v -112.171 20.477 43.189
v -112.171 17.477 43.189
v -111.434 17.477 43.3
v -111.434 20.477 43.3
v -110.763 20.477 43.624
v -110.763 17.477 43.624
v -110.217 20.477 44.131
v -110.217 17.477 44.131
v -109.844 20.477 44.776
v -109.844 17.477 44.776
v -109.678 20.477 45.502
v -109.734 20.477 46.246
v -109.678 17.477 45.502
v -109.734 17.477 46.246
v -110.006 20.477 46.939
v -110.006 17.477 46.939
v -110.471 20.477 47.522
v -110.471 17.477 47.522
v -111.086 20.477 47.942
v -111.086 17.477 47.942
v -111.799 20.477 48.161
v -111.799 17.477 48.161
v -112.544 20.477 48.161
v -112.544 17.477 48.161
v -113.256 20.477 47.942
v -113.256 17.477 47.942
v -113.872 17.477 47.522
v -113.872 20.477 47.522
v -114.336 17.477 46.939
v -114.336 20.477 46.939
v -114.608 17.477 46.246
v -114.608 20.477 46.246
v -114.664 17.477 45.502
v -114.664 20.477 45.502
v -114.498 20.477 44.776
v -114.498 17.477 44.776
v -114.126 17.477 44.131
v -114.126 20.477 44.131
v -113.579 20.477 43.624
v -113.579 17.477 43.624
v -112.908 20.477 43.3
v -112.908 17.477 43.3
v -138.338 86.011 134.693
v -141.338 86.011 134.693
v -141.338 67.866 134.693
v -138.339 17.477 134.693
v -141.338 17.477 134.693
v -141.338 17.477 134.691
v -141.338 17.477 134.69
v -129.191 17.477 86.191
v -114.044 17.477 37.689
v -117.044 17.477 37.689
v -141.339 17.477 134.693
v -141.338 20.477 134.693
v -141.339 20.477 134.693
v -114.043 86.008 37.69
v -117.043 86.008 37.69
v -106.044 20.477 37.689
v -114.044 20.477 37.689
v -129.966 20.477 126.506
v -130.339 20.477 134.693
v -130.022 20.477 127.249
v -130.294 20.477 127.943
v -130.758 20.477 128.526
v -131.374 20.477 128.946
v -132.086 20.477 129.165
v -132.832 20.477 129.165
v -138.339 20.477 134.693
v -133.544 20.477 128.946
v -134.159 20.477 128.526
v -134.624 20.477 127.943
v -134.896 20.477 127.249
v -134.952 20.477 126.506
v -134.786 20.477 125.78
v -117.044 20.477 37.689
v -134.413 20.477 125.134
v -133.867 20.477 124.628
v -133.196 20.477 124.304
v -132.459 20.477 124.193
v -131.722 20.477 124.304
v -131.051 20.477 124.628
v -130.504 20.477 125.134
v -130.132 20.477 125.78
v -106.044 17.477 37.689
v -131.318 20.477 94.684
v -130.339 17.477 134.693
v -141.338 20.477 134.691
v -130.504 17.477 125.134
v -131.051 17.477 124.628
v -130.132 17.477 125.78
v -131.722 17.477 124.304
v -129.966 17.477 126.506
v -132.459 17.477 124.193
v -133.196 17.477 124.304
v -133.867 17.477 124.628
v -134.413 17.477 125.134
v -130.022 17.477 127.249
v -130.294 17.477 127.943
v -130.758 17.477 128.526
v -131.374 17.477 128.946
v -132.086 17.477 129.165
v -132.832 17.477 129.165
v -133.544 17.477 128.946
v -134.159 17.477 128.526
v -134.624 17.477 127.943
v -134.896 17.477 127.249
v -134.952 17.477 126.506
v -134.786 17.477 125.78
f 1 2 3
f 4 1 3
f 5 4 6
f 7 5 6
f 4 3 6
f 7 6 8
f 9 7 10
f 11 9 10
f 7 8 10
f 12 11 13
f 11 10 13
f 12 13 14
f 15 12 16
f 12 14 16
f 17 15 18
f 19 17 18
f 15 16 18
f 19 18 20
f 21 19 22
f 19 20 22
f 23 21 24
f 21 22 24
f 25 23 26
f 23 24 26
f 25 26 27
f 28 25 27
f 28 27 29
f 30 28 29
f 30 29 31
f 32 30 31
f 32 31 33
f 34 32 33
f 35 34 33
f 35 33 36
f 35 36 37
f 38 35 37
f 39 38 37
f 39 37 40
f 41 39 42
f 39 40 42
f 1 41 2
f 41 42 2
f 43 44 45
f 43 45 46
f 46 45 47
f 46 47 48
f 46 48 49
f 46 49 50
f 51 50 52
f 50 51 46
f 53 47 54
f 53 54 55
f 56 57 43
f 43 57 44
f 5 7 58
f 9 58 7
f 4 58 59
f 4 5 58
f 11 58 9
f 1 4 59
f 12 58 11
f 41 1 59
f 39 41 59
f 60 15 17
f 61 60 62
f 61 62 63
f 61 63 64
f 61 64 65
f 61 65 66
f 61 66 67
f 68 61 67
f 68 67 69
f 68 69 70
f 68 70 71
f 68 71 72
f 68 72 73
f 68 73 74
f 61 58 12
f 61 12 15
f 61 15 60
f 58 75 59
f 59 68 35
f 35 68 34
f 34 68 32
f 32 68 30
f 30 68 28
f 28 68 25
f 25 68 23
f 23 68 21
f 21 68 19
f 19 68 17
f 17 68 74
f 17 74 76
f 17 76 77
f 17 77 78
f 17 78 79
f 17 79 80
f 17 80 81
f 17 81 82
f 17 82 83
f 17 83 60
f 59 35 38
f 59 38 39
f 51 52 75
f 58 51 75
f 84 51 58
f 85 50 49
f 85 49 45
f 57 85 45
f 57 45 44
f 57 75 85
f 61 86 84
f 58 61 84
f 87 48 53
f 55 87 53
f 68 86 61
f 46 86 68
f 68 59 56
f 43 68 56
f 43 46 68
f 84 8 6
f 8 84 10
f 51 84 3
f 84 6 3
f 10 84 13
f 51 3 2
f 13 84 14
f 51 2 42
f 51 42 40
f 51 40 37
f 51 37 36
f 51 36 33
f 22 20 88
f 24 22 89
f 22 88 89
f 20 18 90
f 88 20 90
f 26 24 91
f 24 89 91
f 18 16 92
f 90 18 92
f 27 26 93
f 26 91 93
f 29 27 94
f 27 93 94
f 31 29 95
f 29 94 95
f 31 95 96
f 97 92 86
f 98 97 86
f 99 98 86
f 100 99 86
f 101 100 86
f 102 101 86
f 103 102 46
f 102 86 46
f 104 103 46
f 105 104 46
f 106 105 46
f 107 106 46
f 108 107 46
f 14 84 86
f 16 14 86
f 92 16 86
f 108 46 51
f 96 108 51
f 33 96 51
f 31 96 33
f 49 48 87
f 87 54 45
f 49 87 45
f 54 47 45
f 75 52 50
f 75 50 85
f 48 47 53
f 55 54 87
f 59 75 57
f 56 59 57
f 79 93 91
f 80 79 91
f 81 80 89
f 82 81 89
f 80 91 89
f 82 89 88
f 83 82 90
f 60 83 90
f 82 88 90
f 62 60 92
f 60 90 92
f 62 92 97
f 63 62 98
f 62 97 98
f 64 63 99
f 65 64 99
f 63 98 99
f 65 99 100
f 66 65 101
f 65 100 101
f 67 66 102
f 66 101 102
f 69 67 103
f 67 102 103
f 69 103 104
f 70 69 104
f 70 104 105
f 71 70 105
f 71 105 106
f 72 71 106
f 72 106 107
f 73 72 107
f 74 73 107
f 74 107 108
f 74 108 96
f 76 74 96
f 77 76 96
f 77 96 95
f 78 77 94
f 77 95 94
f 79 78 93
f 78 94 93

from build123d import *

# Parameters (mm, degrees)
BOSS_EXTRUDE6_START       = -141.338468014
BOSS_EXTRUDE6_DEPTH       = 27.296026611
BOSS_EXTRUDE6_START_2     = -101.470072675
BOSS_EXTRUDE6_2_OUTLINE_W = 72
BOSS_EXTRUDE6_2_OUTLINE_H = 103
BOSS_EXTRUDE6_2_DEPTH     = 23.568848061
BOSS_EXTRUDE6_START_3     = -127.947953139
BOSS_EXTRUDE6_3_OUTLINE_W = 72
BOSS_EXTRUDE6_3_OUTLINE_H = 103
BOSS_EXTRUDE6_3_DEPTH     = 23.567768302
SKETCH1_R                 = 2.5
BOSS_EXTRUDE8_DEPTH       = 3


with BuildPart() as part:
    # Boss-Extrude6: read off the stored shape, not the designer's step
    # Boss-Extrude6 outline → Boss-Extrude6 (new body)
    with BuildSketch(Plane.YZ.offset(BOSS_EXTRUDE6_START)):
        Polygon((86.01064189, 134.693213905), (17.476837079, 134.693213905), (17.476837075, 37.689278418), (86.008364377, 37.690000992), align=None)
    extrude(amount=BOSS_EXTRUDE6_DEPTH)

    # Boss-Extrude6 2 outline → Boss-Extrude6 2 (cut)
    with BuildSketch(Plane(origin=(0, 0, 0), x_dir=(1.5283083166138014e-05, 0.9999999998758877, 3.827802984502311e-06), z_dir=(0.9700373872996308, -1.5755148579155195e-05, 0.24295568936059395)).offset(BOSS_EXTRUDE6_START_2)):
        with Locations((52, 114.5)):
            Rectangle(BOSS_EXTRUDE6_2_OUTLINE_W, BOSS_EXTRUDE6_2_OUTLINE_H)
    extrude(amount=BOSS_EXTRUDE6_2_DEPTH, mode=Mode.SUBTRACT)

    # Boss-Extrude6 3 outline → Boss-Extrude6 3 (cut)
    with BuildSketch(Plane(origin=(0, 0, 0), x_dir=(1.5283083166138014e-05, 0.9999999998758877, 3.827802984502311e-06), z_dir=(0.9700373872996308, -1.5755148579155195e-05, 0.24295568936059395)).offset(BOSS_EXTRUDE6_START_3)):
        with Locations((52, 114.5)):
            Rectangle(BOSS_EXTRUDE6_3_OUTLINE_W, BOSS_EXTRUDE6_3_OUTLINE_H)
    extrude(amount=BOSS_EXTRUDE6_3_DEPTH, mode=Mode.SUBTRACT)

    # Sketch1 → Boss-Extrude8 (add)
    with BuildSketch(Plane.XZ.offset(-17.476837075)):
        Polygon((-138.338991718, 134.693148321), (-130.338991718, 134.693148321), (-106.043946484, 37.689278418), (-114.043946484, 37.689278418), (-117.043946484, 37.689278418), (-141.338991718, 134.693148321), align=None)
        with Locations(Location((-132.458903411, 126.693148321, 0), (0, 0, 270))):
            Circle(SKETCH1_R, mode=Mode.SUBTRACT)
        with Locations(Location((-112.171128445, 45.689278418, 0), (0, 0, 270))):
            Circle(SKETCH1_R, mode=Mode.SUBTRACT)
    extrude(amount=-BOSS_EXTRUDE8_DEPTH)


solid = part.part
